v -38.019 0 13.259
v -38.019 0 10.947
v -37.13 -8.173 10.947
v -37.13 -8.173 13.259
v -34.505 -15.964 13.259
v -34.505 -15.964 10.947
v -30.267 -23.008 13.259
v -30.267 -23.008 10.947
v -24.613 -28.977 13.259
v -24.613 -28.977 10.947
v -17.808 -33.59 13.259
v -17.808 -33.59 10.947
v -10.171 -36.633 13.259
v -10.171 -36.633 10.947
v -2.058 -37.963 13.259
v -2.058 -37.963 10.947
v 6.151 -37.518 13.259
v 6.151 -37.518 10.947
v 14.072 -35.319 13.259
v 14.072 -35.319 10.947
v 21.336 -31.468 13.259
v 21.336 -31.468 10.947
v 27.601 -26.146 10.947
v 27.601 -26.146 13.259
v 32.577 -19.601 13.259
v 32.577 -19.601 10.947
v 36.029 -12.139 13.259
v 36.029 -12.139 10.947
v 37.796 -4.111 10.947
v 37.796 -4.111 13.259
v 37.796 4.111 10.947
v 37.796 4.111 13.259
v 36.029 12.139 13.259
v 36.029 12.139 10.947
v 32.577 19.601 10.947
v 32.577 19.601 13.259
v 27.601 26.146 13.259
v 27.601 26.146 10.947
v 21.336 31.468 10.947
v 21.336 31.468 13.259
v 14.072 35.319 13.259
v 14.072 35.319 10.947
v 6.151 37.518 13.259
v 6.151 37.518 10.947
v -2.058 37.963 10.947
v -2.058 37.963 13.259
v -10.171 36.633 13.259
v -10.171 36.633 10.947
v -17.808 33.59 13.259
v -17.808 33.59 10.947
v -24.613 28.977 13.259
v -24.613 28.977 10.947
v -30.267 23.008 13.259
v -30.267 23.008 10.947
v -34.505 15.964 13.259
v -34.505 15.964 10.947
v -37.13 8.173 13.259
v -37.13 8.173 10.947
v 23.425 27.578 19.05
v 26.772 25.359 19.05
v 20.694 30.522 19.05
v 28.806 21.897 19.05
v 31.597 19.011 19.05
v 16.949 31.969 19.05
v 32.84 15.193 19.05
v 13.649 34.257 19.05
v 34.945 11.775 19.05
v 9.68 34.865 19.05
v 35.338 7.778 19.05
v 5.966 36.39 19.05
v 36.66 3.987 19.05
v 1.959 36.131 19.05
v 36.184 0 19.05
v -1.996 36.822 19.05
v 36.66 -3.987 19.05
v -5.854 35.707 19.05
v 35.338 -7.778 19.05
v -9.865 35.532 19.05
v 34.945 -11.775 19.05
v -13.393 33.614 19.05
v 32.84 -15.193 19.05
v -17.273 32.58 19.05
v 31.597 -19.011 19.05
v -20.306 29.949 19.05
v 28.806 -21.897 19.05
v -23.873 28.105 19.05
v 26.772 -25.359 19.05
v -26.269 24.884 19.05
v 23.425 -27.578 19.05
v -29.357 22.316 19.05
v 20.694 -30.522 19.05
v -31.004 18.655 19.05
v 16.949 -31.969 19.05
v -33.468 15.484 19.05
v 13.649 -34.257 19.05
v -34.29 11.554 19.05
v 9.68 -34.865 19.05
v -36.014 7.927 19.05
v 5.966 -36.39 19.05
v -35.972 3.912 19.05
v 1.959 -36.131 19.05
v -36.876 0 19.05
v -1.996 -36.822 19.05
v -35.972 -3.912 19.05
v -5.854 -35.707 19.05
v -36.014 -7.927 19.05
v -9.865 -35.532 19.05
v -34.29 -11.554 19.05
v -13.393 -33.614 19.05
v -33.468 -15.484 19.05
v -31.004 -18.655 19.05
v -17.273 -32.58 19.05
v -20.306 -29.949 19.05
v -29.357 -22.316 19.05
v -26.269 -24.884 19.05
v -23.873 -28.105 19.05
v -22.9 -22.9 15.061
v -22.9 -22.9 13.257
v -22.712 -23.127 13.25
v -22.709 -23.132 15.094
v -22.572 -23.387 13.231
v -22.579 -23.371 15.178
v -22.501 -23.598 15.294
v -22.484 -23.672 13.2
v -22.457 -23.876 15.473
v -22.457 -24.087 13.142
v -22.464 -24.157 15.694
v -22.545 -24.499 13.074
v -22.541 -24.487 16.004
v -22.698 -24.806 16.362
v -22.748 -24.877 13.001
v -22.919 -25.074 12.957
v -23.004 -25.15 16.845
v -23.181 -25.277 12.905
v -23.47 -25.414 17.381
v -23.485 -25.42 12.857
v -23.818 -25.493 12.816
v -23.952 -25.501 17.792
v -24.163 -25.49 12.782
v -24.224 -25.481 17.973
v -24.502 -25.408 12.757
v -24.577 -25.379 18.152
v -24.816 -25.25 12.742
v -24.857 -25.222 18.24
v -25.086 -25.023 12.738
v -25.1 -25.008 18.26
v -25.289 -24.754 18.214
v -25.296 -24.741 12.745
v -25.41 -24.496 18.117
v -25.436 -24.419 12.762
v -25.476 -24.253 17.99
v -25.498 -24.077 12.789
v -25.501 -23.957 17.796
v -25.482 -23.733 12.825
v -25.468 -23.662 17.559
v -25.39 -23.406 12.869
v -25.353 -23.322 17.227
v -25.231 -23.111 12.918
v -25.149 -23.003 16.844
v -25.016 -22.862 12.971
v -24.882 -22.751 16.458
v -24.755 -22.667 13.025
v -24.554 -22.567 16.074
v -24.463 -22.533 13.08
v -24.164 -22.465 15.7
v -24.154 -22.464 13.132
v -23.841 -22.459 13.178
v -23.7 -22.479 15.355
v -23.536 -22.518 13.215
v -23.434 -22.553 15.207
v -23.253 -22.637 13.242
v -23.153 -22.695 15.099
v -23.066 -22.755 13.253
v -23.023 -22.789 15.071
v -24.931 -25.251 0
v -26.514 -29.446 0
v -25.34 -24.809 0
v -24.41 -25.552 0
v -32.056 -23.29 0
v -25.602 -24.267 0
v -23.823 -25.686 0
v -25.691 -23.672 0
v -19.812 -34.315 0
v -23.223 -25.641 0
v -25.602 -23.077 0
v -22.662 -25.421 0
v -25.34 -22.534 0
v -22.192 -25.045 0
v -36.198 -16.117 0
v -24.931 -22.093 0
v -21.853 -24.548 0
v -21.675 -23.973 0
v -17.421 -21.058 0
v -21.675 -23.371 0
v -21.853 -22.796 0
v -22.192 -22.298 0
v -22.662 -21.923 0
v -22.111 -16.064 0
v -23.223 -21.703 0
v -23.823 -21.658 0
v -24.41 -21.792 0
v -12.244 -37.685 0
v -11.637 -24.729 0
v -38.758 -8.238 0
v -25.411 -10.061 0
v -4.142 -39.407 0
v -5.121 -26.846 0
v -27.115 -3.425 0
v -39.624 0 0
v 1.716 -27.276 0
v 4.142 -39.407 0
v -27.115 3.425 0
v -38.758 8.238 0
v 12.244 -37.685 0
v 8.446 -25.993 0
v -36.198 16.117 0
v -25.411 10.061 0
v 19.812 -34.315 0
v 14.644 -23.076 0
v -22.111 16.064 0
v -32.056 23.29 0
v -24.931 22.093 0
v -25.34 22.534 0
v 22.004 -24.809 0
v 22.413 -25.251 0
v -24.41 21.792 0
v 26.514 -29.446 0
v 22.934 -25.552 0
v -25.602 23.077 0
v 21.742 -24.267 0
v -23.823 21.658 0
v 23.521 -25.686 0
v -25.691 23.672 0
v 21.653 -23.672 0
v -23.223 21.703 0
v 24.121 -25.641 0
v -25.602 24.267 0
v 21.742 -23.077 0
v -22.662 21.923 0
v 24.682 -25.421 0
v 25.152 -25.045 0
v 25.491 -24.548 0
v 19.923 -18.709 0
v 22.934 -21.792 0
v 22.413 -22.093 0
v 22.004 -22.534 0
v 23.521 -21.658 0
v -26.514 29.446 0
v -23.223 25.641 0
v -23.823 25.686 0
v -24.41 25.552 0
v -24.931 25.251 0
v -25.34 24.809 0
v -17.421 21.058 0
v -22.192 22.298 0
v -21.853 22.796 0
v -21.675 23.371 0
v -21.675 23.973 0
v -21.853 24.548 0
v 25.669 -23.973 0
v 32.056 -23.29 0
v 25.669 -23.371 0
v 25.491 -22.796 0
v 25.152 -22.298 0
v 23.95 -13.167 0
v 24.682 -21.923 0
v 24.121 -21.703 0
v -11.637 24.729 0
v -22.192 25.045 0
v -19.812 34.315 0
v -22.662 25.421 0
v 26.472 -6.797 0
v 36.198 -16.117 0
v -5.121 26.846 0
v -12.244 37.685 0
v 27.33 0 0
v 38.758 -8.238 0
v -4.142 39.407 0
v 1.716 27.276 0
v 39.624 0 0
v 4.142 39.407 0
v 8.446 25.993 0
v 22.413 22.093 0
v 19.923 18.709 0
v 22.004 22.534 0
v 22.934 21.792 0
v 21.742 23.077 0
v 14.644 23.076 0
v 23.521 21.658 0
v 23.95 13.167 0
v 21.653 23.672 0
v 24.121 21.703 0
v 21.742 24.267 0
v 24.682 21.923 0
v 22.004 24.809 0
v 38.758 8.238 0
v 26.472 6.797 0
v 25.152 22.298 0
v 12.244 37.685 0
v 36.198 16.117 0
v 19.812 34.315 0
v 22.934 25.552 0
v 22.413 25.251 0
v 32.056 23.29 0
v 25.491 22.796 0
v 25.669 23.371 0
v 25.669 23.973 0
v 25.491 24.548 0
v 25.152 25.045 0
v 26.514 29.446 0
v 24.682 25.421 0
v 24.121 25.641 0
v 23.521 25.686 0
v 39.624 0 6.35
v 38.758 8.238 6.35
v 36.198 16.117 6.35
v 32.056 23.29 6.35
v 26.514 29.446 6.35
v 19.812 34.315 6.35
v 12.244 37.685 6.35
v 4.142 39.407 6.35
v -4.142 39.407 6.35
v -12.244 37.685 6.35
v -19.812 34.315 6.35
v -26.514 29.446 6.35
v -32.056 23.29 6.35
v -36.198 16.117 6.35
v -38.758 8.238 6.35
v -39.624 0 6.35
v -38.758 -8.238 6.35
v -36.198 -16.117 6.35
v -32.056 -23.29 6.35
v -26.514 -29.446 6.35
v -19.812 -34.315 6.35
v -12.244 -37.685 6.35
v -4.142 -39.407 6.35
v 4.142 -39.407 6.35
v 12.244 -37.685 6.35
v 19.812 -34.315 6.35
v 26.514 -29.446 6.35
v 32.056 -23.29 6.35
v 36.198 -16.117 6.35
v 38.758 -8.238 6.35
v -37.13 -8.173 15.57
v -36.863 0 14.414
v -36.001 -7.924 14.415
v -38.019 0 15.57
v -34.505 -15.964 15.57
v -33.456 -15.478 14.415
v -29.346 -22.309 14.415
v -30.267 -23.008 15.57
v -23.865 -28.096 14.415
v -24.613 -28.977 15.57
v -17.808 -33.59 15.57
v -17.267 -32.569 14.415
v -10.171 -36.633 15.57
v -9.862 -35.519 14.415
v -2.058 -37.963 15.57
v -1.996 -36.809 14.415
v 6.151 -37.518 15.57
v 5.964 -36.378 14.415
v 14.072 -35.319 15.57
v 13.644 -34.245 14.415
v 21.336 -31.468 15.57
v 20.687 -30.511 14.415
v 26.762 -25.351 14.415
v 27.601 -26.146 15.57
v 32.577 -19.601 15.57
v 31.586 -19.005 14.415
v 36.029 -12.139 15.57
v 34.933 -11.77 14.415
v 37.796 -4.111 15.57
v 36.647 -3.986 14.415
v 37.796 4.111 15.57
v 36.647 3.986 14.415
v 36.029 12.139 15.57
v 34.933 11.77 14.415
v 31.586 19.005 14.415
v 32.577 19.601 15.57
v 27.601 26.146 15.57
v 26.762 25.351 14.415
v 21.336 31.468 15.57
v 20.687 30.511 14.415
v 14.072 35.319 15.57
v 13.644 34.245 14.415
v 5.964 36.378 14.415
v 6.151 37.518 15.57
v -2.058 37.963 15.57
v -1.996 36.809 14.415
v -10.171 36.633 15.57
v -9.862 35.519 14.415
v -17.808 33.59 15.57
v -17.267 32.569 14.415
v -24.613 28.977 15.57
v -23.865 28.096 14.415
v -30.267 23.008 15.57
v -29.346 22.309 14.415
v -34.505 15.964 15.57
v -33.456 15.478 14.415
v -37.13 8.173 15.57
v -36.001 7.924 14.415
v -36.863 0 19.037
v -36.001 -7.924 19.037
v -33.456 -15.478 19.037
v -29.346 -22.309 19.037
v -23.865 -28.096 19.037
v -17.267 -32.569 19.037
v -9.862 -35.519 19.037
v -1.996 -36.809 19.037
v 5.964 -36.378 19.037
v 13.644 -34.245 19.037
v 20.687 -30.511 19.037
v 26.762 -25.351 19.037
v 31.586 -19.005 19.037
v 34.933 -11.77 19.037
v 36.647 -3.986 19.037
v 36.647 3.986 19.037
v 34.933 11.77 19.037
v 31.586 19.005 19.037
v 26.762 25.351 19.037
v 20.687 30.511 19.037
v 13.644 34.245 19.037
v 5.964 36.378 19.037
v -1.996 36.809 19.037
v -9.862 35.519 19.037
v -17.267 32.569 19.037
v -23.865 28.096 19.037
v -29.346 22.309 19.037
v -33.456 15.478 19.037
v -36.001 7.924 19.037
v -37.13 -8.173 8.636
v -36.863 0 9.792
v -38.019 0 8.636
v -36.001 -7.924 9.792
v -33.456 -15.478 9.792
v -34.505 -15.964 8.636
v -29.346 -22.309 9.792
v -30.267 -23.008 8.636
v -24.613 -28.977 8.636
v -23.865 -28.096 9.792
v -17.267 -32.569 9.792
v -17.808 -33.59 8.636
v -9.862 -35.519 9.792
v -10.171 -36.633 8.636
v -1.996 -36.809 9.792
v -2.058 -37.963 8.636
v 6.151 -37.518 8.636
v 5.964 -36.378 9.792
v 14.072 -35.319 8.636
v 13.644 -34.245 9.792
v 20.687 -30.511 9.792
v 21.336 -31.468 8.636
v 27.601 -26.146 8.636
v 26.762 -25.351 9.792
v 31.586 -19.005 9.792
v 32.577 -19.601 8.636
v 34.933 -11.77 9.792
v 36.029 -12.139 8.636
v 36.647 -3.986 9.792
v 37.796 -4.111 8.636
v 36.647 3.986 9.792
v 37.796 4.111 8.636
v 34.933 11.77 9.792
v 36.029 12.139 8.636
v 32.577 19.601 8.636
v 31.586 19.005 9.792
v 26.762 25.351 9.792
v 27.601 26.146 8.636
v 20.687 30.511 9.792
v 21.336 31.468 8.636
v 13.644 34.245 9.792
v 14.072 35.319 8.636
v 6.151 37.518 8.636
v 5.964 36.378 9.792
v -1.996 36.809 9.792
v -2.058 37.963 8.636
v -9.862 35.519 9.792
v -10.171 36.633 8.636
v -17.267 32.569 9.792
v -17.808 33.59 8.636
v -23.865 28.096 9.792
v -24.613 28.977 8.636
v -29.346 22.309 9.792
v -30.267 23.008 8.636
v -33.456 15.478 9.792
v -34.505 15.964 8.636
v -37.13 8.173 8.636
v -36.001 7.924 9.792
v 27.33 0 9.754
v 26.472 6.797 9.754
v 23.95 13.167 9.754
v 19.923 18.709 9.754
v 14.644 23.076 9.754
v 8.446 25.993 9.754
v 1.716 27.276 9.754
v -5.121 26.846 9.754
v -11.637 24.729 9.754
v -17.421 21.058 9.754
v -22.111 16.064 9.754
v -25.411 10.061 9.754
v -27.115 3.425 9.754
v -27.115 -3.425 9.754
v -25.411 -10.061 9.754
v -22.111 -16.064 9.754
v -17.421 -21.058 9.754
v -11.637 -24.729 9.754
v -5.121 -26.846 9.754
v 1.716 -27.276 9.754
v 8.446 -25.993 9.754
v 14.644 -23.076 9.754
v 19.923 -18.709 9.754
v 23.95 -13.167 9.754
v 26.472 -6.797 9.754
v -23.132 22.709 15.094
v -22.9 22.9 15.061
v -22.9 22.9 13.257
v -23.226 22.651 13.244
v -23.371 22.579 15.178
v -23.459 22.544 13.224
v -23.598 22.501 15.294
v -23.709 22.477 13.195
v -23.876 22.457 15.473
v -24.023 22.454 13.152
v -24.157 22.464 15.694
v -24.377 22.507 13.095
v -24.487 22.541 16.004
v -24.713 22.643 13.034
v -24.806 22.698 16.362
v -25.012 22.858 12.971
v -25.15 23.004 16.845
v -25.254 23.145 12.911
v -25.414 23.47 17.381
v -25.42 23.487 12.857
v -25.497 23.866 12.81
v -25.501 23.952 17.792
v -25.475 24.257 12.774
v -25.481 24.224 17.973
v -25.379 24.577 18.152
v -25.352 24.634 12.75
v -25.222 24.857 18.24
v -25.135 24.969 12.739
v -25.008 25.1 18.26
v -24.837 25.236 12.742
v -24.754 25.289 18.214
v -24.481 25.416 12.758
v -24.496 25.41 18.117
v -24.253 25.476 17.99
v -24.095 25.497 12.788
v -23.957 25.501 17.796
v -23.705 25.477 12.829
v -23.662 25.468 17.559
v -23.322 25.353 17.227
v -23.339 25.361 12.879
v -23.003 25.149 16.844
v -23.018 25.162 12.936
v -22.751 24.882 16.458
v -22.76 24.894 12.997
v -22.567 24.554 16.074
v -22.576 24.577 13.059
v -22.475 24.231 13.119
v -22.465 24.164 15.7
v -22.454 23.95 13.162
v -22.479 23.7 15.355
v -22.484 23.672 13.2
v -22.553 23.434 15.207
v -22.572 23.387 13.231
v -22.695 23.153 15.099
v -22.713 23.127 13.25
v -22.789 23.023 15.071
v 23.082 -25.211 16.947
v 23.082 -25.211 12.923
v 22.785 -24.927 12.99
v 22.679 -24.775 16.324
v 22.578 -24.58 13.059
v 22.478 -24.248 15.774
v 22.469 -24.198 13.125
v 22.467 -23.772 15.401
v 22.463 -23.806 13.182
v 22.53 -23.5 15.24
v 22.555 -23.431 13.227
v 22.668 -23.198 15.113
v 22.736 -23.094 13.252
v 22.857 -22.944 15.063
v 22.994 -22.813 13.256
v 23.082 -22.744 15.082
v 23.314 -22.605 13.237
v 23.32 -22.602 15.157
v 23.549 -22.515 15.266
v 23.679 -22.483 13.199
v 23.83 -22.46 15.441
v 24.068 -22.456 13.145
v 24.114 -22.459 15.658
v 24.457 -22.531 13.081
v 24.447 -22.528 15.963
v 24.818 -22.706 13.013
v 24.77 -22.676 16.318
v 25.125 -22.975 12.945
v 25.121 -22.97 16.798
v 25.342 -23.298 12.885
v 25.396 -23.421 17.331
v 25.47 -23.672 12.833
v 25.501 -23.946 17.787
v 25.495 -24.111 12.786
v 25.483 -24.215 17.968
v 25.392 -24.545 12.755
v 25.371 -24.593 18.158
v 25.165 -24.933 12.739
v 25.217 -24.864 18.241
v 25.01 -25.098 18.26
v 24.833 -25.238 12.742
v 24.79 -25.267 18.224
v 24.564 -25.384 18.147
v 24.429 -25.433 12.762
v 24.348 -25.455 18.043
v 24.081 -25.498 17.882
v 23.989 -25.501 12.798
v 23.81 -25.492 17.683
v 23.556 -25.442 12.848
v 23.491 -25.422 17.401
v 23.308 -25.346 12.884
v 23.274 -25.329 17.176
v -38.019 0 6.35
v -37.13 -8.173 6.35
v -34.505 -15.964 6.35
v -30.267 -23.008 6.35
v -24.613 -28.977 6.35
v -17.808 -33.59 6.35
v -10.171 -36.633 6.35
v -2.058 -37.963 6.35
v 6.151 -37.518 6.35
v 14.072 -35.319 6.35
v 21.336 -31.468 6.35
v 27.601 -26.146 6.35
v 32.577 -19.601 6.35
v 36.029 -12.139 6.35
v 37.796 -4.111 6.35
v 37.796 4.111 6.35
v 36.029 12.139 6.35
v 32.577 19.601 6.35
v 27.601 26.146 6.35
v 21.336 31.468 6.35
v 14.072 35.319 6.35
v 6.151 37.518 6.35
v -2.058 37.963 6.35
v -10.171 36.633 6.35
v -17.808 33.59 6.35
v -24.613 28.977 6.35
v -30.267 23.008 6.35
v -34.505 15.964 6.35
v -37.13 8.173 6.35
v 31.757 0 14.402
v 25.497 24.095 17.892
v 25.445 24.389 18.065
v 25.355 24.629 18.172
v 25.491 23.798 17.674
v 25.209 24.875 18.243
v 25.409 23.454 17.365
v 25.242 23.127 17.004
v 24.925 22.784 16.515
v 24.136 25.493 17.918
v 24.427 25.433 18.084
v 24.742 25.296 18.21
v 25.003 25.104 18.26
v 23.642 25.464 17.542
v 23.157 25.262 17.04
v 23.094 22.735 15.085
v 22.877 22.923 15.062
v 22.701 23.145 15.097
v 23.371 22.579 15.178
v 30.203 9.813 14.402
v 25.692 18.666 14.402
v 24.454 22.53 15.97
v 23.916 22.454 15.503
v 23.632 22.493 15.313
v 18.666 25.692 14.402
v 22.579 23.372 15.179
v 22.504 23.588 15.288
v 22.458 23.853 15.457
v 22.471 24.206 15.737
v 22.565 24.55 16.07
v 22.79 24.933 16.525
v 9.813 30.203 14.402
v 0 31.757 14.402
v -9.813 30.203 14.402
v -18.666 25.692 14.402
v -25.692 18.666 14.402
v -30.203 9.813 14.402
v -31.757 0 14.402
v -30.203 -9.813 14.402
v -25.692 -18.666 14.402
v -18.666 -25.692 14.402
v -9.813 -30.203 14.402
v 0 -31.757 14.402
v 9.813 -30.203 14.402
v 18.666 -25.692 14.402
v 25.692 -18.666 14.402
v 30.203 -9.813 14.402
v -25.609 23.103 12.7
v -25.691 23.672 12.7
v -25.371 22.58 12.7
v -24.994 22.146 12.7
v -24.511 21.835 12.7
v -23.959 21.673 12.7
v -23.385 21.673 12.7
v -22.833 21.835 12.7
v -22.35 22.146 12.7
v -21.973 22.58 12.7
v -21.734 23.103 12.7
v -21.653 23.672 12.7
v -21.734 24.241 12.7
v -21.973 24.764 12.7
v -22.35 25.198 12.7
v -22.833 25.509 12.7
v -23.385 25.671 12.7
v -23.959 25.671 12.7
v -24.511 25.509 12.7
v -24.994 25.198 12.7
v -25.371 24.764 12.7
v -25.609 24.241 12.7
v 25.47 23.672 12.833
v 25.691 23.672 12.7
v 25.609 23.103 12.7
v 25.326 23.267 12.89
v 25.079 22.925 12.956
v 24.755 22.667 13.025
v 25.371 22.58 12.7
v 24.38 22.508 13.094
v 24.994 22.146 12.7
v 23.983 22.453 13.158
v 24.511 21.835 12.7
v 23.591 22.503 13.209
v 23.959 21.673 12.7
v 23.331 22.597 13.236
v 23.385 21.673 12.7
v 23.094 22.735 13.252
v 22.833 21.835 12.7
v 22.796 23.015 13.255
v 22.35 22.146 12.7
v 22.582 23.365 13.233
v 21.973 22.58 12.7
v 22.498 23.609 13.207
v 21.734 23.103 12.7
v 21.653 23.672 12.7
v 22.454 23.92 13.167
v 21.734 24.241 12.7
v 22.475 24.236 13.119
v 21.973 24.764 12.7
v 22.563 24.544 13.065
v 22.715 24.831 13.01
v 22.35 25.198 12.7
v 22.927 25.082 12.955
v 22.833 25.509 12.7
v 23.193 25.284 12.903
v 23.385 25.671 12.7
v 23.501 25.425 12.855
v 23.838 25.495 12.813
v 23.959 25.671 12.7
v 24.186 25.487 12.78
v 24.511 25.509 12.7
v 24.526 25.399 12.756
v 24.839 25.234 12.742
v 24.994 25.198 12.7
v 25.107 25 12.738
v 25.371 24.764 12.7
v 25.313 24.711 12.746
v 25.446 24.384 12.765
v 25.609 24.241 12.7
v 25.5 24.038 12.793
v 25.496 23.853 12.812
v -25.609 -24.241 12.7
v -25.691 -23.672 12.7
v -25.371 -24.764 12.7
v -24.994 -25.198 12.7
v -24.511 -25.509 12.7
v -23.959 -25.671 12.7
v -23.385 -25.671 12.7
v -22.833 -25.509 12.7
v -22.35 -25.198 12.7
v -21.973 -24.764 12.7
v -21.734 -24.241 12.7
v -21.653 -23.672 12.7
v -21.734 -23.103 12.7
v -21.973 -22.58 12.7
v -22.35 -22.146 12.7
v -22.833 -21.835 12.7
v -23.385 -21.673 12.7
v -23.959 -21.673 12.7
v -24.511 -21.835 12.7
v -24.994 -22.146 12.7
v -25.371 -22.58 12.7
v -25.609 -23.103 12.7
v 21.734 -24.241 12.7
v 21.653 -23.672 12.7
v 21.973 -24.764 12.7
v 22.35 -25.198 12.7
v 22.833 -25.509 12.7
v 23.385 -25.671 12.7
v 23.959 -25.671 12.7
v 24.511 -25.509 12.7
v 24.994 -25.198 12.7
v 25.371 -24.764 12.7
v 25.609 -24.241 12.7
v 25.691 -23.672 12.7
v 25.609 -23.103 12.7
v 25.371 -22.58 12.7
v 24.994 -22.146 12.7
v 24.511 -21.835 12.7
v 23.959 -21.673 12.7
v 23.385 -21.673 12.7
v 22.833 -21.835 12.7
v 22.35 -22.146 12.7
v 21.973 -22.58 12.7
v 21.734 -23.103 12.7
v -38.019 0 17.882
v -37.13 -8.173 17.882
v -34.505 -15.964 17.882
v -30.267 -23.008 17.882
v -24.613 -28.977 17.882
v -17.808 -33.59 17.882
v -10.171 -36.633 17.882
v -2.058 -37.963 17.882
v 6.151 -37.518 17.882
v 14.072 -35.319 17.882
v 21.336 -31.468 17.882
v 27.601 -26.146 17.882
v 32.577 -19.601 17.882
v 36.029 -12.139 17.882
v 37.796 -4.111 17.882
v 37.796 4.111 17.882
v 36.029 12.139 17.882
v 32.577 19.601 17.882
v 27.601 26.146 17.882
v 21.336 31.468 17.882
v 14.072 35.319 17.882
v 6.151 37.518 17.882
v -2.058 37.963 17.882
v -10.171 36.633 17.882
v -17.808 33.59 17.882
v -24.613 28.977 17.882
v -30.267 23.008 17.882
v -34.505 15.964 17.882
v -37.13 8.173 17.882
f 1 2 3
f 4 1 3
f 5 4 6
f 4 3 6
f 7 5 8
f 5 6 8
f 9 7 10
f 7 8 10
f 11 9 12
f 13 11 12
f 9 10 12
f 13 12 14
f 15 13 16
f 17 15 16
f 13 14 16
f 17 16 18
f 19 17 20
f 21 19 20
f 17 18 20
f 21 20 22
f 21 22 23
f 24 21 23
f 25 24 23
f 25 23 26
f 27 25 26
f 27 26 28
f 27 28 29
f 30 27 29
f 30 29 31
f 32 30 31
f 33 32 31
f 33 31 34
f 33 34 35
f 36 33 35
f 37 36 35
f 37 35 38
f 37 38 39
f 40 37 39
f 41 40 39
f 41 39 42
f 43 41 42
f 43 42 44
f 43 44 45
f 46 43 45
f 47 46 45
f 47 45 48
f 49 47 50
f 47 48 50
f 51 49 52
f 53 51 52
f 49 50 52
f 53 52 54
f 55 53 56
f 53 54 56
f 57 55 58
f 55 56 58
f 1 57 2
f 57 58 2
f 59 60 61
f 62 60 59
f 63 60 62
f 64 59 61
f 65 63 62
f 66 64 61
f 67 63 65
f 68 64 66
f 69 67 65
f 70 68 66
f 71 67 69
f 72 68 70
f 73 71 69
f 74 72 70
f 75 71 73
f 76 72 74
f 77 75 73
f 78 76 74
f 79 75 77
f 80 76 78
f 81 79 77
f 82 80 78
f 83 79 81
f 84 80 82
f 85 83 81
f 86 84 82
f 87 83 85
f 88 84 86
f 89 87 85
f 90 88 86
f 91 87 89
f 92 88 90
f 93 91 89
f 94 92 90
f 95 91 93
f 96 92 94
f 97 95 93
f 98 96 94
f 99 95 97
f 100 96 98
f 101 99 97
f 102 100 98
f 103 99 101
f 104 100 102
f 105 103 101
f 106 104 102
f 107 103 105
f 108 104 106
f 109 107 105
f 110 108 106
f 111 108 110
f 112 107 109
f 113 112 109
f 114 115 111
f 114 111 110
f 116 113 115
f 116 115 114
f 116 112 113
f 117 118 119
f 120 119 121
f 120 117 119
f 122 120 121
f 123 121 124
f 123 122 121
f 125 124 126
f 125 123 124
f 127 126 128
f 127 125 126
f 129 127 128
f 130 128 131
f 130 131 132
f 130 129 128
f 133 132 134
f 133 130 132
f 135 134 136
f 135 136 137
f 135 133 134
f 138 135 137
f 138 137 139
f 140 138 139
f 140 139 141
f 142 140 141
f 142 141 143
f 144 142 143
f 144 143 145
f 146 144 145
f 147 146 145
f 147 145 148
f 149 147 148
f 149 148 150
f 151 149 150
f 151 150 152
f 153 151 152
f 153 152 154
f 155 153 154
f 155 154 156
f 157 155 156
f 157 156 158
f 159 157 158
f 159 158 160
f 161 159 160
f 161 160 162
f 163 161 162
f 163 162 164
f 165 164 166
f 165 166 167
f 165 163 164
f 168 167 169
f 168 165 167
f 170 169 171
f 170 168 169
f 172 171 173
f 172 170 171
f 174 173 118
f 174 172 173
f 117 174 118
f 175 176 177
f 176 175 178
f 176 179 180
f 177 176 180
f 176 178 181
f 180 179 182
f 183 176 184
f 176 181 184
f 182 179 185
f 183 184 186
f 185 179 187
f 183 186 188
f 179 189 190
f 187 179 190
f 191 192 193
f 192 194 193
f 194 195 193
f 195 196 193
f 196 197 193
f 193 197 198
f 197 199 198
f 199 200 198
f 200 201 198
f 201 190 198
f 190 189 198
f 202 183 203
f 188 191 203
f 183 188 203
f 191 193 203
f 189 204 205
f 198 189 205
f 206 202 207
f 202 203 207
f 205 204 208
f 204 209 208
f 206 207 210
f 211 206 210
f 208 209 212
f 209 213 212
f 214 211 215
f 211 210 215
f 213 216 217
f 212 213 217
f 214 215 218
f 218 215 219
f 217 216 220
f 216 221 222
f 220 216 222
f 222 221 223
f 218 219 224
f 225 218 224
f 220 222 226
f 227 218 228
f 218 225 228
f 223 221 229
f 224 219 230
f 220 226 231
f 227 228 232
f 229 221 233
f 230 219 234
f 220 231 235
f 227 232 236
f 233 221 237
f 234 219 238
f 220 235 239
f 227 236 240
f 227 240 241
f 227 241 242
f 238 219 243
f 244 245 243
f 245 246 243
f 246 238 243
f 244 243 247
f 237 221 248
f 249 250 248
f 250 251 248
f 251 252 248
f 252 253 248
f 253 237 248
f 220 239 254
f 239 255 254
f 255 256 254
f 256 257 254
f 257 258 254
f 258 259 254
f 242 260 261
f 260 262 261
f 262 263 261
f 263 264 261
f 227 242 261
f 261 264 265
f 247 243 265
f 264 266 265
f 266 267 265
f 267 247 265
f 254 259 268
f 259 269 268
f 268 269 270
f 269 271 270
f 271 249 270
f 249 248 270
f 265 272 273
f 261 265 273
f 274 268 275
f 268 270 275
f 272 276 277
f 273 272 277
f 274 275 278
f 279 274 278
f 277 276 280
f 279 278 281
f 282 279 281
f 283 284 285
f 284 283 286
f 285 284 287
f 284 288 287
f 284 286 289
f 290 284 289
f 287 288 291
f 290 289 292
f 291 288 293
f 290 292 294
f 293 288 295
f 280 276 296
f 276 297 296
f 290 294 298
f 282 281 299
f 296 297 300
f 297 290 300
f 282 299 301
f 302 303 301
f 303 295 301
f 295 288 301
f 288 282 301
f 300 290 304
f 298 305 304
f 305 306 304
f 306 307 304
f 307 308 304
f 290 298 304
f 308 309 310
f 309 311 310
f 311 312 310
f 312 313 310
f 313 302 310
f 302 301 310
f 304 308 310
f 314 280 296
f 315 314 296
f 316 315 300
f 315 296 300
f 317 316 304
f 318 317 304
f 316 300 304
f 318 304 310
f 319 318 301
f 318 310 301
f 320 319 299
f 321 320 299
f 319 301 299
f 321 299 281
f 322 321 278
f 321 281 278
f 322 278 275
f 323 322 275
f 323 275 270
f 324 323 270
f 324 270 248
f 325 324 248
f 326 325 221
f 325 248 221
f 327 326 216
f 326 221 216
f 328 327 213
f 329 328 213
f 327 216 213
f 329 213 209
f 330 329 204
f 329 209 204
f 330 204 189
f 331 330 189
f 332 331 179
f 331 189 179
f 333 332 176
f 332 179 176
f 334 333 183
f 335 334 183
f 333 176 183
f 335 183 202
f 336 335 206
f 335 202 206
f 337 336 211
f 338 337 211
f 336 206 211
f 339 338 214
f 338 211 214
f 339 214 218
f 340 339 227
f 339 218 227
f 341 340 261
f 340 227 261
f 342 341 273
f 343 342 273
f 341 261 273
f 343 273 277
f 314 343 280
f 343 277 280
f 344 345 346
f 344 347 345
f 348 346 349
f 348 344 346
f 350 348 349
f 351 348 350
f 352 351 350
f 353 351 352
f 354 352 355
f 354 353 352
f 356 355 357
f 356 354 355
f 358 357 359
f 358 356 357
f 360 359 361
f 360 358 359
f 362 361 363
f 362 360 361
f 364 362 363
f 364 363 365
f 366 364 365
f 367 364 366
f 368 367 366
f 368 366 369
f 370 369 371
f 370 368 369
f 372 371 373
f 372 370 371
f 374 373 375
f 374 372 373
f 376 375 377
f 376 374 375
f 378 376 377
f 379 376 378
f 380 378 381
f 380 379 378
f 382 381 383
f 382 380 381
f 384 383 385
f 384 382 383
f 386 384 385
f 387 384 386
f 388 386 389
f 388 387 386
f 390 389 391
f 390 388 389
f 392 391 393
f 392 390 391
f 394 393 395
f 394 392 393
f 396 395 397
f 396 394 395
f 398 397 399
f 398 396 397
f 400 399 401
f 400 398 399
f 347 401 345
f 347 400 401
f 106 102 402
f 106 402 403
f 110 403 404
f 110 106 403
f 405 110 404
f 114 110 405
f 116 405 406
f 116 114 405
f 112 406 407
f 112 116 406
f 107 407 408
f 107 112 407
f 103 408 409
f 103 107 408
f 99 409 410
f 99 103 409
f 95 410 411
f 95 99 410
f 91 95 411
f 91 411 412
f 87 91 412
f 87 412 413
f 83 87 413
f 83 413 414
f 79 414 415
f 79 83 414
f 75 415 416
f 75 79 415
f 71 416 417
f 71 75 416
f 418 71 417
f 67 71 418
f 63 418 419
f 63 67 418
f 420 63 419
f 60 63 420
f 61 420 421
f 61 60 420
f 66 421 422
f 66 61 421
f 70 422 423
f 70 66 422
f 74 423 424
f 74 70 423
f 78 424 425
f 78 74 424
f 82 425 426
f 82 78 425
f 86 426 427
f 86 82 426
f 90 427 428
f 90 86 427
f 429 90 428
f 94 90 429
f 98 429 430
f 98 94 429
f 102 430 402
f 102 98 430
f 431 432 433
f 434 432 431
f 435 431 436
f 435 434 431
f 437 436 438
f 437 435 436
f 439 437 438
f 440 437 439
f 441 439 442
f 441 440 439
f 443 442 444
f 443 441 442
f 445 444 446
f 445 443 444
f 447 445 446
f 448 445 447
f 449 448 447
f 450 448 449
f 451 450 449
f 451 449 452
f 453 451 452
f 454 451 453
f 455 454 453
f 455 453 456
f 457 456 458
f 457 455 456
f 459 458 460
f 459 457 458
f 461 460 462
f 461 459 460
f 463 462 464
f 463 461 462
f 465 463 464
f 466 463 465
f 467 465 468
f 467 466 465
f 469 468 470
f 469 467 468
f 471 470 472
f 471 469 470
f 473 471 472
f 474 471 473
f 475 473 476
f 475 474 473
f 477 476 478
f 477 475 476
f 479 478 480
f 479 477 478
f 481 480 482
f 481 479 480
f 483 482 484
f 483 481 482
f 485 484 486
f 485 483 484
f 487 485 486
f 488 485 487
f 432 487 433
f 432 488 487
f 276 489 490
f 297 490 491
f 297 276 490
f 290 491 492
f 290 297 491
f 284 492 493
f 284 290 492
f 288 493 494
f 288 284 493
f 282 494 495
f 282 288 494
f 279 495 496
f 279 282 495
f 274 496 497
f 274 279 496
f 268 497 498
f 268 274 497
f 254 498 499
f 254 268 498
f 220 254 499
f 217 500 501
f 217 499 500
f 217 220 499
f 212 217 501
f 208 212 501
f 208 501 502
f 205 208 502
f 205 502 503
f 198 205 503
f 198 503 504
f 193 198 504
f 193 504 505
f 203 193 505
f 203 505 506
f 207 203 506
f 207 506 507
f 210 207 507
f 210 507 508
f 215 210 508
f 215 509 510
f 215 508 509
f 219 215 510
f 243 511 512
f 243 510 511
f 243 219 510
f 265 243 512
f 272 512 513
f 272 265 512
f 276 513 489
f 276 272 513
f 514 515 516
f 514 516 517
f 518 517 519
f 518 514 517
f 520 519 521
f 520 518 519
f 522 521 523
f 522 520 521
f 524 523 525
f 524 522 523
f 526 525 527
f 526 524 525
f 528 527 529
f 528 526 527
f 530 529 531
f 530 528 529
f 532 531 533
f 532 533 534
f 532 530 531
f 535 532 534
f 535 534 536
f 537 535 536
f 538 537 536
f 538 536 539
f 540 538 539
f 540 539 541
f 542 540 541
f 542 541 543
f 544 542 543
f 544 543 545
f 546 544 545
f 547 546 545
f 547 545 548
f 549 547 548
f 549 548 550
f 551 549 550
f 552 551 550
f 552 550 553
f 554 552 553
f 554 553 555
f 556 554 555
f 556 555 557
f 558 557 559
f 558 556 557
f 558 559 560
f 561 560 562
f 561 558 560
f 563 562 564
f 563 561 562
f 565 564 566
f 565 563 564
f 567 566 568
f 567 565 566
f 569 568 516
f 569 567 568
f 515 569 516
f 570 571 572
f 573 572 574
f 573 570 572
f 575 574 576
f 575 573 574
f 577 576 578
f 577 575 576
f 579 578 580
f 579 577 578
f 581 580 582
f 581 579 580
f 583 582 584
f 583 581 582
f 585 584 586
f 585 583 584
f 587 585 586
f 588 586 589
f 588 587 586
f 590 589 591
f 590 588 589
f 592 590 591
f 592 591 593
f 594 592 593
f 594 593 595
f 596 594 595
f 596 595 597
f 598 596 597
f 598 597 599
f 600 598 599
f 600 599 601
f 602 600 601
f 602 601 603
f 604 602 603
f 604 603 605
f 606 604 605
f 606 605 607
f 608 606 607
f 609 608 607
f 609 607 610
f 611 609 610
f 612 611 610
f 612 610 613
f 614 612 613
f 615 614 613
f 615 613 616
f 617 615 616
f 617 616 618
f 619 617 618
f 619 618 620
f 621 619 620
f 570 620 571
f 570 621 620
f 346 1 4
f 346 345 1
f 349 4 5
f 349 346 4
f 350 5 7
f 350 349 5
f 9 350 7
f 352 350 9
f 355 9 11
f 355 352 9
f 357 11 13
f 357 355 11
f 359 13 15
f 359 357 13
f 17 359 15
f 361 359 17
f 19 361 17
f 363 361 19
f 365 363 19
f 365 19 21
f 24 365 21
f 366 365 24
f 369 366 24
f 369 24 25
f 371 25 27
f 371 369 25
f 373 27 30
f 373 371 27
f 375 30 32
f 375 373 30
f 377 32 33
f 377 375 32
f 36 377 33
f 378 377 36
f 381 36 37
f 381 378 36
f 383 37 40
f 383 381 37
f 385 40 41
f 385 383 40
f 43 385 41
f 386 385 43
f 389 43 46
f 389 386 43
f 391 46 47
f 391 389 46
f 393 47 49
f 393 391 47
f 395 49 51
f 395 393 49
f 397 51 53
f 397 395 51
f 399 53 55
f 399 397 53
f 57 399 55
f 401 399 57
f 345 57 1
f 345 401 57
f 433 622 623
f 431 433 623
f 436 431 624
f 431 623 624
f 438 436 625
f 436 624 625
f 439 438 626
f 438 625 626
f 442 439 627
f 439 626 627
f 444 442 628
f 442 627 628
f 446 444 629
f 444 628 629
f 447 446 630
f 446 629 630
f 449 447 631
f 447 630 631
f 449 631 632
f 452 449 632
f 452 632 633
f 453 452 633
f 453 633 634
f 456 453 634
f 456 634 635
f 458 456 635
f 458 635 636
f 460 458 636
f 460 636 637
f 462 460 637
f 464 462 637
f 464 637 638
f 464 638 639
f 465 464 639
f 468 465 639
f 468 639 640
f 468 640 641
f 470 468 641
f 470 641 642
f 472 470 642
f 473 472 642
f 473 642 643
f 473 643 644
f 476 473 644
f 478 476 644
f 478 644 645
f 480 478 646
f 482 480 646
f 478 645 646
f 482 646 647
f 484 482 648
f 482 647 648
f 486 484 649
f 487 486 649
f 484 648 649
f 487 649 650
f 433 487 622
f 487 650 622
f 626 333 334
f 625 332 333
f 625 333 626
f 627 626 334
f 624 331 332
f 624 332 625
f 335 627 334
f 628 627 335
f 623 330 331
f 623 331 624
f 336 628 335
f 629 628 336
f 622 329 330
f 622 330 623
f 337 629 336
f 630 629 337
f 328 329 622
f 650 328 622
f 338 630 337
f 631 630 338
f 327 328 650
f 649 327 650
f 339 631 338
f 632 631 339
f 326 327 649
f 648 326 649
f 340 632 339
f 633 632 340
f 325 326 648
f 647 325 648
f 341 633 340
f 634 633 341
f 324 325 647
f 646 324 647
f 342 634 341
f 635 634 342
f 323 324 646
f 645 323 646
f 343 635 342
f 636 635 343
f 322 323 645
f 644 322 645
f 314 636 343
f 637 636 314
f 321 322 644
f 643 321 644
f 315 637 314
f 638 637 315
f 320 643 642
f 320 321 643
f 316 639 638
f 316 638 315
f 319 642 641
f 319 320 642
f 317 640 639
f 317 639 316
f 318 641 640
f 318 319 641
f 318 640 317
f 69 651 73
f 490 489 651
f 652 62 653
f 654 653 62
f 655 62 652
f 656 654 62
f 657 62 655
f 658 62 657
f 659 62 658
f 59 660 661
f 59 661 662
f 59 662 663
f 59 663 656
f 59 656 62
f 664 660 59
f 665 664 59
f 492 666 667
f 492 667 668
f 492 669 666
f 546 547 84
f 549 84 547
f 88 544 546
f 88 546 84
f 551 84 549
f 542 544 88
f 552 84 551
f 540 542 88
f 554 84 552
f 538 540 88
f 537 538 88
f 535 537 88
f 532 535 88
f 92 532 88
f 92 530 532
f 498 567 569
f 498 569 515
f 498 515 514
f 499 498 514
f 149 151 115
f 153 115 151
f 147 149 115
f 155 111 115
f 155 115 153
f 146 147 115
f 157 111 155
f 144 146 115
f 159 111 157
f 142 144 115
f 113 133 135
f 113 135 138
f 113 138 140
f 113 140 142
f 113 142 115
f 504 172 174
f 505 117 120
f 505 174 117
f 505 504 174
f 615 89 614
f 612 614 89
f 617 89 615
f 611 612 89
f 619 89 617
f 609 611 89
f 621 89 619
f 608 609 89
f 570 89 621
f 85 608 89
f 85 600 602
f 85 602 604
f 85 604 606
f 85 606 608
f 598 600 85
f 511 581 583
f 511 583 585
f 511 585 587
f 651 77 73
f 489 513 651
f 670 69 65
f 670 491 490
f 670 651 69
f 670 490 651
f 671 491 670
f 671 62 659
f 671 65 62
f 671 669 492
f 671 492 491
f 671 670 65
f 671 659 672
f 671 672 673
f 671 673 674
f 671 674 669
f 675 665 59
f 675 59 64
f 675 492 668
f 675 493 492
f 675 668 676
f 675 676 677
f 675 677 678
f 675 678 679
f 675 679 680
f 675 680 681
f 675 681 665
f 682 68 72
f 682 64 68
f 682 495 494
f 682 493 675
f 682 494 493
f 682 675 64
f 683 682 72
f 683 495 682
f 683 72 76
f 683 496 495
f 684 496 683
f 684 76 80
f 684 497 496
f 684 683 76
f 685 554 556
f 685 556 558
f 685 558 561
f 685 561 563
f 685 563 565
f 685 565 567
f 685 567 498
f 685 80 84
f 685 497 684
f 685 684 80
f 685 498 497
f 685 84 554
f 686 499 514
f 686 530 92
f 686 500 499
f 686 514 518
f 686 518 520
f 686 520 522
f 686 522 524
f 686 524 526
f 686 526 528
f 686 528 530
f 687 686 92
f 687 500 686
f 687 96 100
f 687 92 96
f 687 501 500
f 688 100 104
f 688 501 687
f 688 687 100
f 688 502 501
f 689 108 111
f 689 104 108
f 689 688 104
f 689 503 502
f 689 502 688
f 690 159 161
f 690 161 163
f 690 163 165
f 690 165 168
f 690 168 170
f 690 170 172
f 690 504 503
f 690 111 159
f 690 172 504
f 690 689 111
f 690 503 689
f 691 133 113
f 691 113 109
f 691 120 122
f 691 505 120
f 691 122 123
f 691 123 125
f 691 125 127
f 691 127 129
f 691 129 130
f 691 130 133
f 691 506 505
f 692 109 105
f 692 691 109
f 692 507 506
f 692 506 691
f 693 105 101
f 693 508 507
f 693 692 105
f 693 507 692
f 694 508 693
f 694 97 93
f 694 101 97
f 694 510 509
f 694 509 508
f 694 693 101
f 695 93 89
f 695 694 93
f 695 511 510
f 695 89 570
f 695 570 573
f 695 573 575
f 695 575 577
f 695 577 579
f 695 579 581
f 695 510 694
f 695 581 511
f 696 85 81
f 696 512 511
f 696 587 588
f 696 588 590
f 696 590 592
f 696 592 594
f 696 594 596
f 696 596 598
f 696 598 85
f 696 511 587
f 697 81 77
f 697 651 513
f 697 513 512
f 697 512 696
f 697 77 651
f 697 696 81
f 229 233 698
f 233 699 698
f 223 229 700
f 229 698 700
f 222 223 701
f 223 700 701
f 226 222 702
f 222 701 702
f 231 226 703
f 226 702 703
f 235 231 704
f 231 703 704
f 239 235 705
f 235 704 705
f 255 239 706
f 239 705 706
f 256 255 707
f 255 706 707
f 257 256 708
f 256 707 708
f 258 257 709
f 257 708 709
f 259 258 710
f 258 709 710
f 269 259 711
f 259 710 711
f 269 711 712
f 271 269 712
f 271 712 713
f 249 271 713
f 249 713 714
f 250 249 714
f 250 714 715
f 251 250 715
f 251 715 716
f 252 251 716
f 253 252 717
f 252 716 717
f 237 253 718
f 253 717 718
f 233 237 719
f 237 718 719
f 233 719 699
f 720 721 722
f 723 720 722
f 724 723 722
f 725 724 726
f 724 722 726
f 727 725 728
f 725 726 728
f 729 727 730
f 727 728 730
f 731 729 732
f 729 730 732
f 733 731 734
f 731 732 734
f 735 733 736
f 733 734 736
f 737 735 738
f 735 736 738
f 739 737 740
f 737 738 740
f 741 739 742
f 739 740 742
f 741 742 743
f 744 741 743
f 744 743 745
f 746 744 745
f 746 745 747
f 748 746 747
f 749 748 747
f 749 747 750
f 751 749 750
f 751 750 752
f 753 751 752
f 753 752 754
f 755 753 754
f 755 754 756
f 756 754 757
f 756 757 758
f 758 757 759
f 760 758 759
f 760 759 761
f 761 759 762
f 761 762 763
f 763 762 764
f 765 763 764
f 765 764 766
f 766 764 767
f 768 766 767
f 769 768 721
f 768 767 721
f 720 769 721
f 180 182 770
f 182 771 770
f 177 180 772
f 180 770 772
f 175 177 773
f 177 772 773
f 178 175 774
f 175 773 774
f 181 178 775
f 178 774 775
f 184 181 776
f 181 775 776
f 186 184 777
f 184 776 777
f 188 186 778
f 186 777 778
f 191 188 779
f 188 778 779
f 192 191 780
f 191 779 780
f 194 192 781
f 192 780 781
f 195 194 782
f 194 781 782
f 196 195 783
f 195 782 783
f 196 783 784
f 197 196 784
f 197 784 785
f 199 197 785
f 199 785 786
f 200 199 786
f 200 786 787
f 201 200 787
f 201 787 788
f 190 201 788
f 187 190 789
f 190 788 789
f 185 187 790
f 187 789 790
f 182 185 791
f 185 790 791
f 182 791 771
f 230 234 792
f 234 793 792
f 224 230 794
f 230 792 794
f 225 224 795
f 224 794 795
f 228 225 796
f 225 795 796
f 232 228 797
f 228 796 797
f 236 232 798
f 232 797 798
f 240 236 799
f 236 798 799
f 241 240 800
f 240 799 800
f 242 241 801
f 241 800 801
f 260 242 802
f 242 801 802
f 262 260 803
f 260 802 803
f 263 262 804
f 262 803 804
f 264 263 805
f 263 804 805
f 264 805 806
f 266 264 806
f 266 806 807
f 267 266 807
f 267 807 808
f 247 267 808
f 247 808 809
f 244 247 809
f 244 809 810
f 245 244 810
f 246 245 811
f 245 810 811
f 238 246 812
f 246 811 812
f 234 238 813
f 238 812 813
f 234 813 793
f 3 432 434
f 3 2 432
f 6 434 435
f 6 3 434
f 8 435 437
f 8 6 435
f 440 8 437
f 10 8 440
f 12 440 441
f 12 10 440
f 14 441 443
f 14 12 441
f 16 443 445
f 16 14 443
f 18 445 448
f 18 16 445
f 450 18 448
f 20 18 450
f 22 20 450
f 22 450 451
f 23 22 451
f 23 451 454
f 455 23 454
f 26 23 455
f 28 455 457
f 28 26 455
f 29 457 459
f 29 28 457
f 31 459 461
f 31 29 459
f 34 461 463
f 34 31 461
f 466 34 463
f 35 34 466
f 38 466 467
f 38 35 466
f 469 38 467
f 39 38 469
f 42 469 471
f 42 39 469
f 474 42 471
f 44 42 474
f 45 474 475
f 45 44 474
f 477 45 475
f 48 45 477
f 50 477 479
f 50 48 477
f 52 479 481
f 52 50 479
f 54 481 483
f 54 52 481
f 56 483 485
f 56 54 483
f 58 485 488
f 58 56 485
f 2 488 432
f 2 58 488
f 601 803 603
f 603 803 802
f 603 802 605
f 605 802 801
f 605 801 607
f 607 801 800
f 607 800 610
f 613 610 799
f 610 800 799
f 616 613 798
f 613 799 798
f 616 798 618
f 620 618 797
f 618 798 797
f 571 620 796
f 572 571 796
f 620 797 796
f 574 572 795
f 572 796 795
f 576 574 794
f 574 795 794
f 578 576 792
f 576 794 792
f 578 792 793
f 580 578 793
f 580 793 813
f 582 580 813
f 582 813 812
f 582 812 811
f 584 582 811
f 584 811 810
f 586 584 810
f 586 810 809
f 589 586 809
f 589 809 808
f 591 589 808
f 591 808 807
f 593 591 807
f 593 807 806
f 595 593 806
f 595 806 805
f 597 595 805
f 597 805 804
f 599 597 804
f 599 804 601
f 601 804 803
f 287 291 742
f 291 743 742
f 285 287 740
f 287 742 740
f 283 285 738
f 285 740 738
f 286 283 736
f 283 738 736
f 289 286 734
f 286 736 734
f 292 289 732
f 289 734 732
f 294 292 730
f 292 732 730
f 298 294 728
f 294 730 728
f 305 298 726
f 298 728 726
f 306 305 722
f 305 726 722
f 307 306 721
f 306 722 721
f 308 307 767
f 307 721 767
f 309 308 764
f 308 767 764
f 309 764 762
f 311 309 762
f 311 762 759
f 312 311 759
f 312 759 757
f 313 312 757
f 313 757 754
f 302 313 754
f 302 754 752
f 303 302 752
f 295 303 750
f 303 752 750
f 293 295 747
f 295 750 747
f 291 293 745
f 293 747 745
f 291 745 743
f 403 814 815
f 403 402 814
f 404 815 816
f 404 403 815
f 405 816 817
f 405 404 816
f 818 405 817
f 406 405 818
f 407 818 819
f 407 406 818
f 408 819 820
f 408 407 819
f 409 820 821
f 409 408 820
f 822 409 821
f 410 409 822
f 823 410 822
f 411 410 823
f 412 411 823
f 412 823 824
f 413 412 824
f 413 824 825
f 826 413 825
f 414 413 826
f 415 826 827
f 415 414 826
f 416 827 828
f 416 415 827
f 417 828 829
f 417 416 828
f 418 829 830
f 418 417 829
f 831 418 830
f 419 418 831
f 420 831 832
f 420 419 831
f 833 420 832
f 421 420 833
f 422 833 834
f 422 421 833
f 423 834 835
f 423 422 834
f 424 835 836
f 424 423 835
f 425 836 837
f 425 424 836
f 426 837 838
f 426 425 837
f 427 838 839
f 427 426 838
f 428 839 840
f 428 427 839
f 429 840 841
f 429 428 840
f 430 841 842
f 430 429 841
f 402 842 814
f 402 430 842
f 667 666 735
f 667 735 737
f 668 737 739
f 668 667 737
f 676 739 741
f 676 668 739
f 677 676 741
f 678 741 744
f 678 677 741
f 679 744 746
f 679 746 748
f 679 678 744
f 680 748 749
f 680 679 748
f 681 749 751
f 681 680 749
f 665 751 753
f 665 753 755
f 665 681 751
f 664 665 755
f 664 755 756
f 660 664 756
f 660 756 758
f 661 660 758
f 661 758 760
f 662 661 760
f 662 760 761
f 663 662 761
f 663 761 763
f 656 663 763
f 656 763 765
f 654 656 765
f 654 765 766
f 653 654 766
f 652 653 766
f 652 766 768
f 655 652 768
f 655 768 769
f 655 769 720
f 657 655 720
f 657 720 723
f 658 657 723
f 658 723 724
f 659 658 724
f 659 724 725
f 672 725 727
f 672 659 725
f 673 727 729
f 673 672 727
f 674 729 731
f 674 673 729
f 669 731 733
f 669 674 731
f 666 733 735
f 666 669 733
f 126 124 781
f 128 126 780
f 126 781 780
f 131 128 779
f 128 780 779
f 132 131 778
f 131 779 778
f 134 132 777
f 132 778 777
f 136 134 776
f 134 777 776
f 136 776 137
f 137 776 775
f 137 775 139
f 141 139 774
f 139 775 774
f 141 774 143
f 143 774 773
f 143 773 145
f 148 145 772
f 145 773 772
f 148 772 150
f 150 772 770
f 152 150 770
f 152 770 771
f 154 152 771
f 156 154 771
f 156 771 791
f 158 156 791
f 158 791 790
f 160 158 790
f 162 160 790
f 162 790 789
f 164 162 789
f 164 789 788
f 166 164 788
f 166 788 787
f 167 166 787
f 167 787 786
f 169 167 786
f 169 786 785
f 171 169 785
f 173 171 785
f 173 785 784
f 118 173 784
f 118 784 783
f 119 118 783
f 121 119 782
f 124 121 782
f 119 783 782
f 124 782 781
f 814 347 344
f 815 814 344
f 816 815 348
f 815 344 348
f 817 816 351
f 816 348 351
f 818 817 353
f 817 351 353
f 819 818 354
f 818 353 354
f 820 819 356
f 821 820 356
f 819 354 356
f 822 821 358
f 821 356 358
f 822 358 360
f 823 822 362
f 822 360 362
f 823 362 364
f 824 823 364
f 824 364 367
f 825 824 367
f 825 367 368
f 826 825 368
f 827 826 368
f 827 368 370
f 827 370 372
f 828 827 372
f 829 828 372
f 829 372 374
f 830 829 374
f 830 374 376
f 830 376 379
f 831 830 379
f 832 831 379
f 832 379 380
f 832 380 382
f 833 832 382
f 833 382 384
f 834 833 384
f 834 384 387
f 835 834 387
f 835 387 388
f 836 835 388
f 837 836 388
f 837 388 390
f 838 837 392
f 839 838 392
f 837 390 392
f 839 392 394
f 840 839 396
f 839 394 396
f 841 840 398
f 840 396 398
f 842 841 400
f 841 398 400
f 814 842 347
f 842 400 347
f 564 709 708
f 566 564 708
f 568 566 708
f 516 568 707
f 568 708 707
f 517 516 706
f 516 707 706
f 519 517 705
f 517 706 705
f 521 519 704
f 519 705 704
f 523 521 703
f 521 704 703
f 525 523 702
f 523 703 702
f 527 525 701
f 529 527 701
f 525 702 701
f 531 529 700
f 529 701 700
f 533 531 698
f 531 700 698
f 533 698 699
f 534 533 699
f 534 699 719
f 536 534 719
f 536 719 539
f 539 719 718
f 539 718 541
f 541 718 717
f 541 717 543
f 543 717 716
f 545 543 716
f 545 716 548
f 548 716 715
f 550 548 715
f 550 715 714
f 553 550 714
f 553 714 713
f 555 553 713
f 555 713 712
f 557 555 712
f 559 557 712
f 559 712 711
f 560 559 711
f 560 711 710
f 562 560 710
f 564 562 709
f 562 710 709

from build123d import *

# Parameters (mm, degrees)
SKETCH2_R                  = 39.624
SKETCH2_R_2                = 27.3304
BOSS_EXTRUDE2_DEPTH        = 6.35
SKETCH5_R                  = 38.018820021
SKETCH5_R_2                = 27.3304
BOSS_EXTRUDE3_DEPTH        = 19.05
F_10_32_TAPPED_HOLE1_D     = 4.0386
F_10_32_TAPPED_HOLE1_DEPTH = 12.7
F_10_32_TAPPED_HOLE1_TIP   = 1.213317848
CUT_EXTRUDE2_DEPTH         = 60.186360354
CUT_EXTRUDE2_DEPTH_BACK    = 60.186360354
SKETCH16_R                 = 1.524


with BuildPart() as part:
    # Sketch2 → Boss-Extrude2 (new body)
    with BuildSketch(Plane.XY):
        Circle(SKETCH2_R)
        Circle(SKETCH2_R_2, mode=Mode.SUBTRACT)
    extrude(amount=BOSS_EXTRUDE2_DEPTH)

    # Sketch5 → Boss-Extrude3 (add)
    with BuildSketch(Plane.XY):
        Circle(SKETCH5_R)
        Circle(SKETCH5_R_2, mode=Mode.SUBTRACT)
    extrude(amount=BOSS_EXTRUDE3_DEPTH)

    # Sketch10 → Cut-Revolve2 (revolve, cut)
    with BuildSketch(Plane(origin=(0, 0, 0), x_dir=(0, 0, -1), z_dir=(1, 0, 0))):
        Polygon((-29.4386, 38.018820021), (-27.1272, 38.018820021), (-28.2829, 36.863120021), align=None)
        Polygon((-24.8158, 38.018820021), (-22.5044, 38.018820021), (-23.6601, 36.863120021), align=None)
        Polygon((-20.193, 38.018820021), (-17.8816, 38.018820021), (-19.0373, 36.863120021), align=None)
        Polygon((-15.5702, 38.018820021), (-13.2588, 38.018820021), (-14.4145, 36.863120021), align=None)
        Polygon((-10.9474, 38.018820021), (-8.636, 38.018820021), (-9.7917, 36.863120021), align=None)
    revolve(axis=Axis((0, 0, 50.084179241), (0, 0, 1)), mode=Mode.SUBTRACT)

    # Sketch11 → Cut-Revolve3 (revolve, cut)
    with BuildSketch(Plane(origin=(0, 0, 0), x_dir=(0, 0, -1), z_dir=(1, 0, 0))):
        Polygon((-19.685, 36.788548166), (-6.35, 24.088548166), (-19.685, 24.088548166), align=None)
    revolve(axis=Axis((0, 0, 43.100386529), (0, 0, 1)), mode=Mode.SUBTRACT)

    # #10-32 Tapped Hole1
    with Locations(Plane(origin=(0, 0, 0), x_dir=(1, 0, 0), z_dir=(0, 0, -1))):
        with Locations((23.671955135, 23.671955135), (0, 0), (23.671955135, -23.671955135), (-23.671955135, 23.671955135), (-23.671955135, -23.671955135)):
            Hole(F_10_32_TAPPED_HOLE1_D / 2, depth=F_10_32_TAPPED_HOLE1_DEPTH)
            with Locations((0, 0, -(F_10_32_TAPPED_HOLE1_DEPTH + F_10_32_TAPPED_HOLE1_TIP / 2))):  # 118° drill point
                Cone(0, F_10_32_TAPPED_HOLE1_D / 2, F_10_32_TAPPED_HOLE1_TIP, mode=Mode.SUBTRACT)

    # Sketch16 → Cut-Extrude2 (cut, two sides: drawn at the far end of the back side and taken through both)
    with BuildSketch(Plane(origin=(0, 0, 0), x_dir=(-1, 0, 0), z_dir=(0, 0, -1)).offset(-CUT_EXTRUDE2_DEPTH_BACK)):
        with Locations((23.977283843, 23.977283843)):
            Circle(SKETCH16_R)
        with Locations((-23.977283843, 23.977283843)):
            Circle(SKETCH16_R)
        with Locations((-23.977283843, -23.977283843)):
            Circle(SKETCH16_R)
        with Locations((23.977283843, -23.977283843)):
            Circle(SKETCH16_R)
    extrude(amount=CUT_EXTRUDE2_DEPTH + CUT_EXTRUDE2_DEPTH_BACK, mode=Mode.SUBTRACT)


solid = part.part
